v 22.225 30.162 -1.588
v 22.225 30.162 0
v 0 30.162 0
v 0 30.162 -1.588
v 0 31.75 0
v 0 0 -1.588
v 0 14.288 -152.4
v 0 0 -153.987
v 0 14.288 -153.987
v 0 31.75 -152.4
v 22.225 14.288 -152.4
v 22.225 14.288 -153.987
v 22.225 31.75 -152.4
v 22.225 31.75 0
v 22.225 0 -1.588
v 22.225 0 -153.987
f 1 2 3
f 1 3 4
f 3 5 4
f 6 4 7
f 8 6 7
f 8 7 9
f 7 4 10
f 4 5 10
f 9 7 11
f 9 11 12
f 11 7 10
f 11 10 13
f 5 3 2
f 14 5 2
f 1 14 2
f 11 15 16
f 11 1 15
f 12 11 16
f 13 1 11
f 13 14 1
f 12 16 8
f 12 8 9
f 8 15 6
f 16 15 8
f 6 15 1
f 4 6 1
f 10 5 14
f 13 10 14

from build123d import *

# Parameters (mm, degrees)
SKETCH1_W           = 22.225
SKETCH1_H           = 152.4
BOSS_EXTRUDE1_DEPTH = 31.75
SKETCH2_W           = 1.5875
SKETCH2_H           = 30.1625
CUT_EXTRUDE1_DEPTH  = 23.225
SKETCH3_W           = 1.5875
SKETCH3_H           = 14.2875
BOSS_EXTRUDE2_DEPTH = 22.225


with BuildPart() as part:
    # Sketch1 → Boss-Extrude1 (new body)
    with BuildSketch(Plane(origin=(0, 0, 0), x_dir=(1, 0, 0), z_dir=(0, 1, 0))):
        with Locations((11.1125, 76.2)):
            Rectangle(SKETCH1_W, SKETCH1_H)
    extrude(amount=BOSS_EXTRUDE1_DEPTH)

    # Sketch2 → Cut-Extrude1 (cut, through all)
    with BuildSketch(Plane(origin=(22.225, 0, 0), x_dir=(0, 0, -1), z_dir=(1, 0, 0))):
        with Locations((0.79375, 15.08125)):
            Rectangle(SKETCH2_W, SKETCH2_H)
    extrude(amount=-CUT_EXTRUDE1_DEPTH, mode=Mode.SUBTRACT)

    # Sketch3 → Boss-Extrude2 (add)
    with BuildSketch(Plane(origin=(22.225, 0, 0), x_dir=(0, 0, -1), z_dir=(1, 0, 0))):
        with Locations((153.19375, 7.14375)):
            Rectangle(SKETCH3_W, SKETCH3_H)
    extrude(amount=-BOSS_EXTRUDE2_DEPTH)


solid = part.part
